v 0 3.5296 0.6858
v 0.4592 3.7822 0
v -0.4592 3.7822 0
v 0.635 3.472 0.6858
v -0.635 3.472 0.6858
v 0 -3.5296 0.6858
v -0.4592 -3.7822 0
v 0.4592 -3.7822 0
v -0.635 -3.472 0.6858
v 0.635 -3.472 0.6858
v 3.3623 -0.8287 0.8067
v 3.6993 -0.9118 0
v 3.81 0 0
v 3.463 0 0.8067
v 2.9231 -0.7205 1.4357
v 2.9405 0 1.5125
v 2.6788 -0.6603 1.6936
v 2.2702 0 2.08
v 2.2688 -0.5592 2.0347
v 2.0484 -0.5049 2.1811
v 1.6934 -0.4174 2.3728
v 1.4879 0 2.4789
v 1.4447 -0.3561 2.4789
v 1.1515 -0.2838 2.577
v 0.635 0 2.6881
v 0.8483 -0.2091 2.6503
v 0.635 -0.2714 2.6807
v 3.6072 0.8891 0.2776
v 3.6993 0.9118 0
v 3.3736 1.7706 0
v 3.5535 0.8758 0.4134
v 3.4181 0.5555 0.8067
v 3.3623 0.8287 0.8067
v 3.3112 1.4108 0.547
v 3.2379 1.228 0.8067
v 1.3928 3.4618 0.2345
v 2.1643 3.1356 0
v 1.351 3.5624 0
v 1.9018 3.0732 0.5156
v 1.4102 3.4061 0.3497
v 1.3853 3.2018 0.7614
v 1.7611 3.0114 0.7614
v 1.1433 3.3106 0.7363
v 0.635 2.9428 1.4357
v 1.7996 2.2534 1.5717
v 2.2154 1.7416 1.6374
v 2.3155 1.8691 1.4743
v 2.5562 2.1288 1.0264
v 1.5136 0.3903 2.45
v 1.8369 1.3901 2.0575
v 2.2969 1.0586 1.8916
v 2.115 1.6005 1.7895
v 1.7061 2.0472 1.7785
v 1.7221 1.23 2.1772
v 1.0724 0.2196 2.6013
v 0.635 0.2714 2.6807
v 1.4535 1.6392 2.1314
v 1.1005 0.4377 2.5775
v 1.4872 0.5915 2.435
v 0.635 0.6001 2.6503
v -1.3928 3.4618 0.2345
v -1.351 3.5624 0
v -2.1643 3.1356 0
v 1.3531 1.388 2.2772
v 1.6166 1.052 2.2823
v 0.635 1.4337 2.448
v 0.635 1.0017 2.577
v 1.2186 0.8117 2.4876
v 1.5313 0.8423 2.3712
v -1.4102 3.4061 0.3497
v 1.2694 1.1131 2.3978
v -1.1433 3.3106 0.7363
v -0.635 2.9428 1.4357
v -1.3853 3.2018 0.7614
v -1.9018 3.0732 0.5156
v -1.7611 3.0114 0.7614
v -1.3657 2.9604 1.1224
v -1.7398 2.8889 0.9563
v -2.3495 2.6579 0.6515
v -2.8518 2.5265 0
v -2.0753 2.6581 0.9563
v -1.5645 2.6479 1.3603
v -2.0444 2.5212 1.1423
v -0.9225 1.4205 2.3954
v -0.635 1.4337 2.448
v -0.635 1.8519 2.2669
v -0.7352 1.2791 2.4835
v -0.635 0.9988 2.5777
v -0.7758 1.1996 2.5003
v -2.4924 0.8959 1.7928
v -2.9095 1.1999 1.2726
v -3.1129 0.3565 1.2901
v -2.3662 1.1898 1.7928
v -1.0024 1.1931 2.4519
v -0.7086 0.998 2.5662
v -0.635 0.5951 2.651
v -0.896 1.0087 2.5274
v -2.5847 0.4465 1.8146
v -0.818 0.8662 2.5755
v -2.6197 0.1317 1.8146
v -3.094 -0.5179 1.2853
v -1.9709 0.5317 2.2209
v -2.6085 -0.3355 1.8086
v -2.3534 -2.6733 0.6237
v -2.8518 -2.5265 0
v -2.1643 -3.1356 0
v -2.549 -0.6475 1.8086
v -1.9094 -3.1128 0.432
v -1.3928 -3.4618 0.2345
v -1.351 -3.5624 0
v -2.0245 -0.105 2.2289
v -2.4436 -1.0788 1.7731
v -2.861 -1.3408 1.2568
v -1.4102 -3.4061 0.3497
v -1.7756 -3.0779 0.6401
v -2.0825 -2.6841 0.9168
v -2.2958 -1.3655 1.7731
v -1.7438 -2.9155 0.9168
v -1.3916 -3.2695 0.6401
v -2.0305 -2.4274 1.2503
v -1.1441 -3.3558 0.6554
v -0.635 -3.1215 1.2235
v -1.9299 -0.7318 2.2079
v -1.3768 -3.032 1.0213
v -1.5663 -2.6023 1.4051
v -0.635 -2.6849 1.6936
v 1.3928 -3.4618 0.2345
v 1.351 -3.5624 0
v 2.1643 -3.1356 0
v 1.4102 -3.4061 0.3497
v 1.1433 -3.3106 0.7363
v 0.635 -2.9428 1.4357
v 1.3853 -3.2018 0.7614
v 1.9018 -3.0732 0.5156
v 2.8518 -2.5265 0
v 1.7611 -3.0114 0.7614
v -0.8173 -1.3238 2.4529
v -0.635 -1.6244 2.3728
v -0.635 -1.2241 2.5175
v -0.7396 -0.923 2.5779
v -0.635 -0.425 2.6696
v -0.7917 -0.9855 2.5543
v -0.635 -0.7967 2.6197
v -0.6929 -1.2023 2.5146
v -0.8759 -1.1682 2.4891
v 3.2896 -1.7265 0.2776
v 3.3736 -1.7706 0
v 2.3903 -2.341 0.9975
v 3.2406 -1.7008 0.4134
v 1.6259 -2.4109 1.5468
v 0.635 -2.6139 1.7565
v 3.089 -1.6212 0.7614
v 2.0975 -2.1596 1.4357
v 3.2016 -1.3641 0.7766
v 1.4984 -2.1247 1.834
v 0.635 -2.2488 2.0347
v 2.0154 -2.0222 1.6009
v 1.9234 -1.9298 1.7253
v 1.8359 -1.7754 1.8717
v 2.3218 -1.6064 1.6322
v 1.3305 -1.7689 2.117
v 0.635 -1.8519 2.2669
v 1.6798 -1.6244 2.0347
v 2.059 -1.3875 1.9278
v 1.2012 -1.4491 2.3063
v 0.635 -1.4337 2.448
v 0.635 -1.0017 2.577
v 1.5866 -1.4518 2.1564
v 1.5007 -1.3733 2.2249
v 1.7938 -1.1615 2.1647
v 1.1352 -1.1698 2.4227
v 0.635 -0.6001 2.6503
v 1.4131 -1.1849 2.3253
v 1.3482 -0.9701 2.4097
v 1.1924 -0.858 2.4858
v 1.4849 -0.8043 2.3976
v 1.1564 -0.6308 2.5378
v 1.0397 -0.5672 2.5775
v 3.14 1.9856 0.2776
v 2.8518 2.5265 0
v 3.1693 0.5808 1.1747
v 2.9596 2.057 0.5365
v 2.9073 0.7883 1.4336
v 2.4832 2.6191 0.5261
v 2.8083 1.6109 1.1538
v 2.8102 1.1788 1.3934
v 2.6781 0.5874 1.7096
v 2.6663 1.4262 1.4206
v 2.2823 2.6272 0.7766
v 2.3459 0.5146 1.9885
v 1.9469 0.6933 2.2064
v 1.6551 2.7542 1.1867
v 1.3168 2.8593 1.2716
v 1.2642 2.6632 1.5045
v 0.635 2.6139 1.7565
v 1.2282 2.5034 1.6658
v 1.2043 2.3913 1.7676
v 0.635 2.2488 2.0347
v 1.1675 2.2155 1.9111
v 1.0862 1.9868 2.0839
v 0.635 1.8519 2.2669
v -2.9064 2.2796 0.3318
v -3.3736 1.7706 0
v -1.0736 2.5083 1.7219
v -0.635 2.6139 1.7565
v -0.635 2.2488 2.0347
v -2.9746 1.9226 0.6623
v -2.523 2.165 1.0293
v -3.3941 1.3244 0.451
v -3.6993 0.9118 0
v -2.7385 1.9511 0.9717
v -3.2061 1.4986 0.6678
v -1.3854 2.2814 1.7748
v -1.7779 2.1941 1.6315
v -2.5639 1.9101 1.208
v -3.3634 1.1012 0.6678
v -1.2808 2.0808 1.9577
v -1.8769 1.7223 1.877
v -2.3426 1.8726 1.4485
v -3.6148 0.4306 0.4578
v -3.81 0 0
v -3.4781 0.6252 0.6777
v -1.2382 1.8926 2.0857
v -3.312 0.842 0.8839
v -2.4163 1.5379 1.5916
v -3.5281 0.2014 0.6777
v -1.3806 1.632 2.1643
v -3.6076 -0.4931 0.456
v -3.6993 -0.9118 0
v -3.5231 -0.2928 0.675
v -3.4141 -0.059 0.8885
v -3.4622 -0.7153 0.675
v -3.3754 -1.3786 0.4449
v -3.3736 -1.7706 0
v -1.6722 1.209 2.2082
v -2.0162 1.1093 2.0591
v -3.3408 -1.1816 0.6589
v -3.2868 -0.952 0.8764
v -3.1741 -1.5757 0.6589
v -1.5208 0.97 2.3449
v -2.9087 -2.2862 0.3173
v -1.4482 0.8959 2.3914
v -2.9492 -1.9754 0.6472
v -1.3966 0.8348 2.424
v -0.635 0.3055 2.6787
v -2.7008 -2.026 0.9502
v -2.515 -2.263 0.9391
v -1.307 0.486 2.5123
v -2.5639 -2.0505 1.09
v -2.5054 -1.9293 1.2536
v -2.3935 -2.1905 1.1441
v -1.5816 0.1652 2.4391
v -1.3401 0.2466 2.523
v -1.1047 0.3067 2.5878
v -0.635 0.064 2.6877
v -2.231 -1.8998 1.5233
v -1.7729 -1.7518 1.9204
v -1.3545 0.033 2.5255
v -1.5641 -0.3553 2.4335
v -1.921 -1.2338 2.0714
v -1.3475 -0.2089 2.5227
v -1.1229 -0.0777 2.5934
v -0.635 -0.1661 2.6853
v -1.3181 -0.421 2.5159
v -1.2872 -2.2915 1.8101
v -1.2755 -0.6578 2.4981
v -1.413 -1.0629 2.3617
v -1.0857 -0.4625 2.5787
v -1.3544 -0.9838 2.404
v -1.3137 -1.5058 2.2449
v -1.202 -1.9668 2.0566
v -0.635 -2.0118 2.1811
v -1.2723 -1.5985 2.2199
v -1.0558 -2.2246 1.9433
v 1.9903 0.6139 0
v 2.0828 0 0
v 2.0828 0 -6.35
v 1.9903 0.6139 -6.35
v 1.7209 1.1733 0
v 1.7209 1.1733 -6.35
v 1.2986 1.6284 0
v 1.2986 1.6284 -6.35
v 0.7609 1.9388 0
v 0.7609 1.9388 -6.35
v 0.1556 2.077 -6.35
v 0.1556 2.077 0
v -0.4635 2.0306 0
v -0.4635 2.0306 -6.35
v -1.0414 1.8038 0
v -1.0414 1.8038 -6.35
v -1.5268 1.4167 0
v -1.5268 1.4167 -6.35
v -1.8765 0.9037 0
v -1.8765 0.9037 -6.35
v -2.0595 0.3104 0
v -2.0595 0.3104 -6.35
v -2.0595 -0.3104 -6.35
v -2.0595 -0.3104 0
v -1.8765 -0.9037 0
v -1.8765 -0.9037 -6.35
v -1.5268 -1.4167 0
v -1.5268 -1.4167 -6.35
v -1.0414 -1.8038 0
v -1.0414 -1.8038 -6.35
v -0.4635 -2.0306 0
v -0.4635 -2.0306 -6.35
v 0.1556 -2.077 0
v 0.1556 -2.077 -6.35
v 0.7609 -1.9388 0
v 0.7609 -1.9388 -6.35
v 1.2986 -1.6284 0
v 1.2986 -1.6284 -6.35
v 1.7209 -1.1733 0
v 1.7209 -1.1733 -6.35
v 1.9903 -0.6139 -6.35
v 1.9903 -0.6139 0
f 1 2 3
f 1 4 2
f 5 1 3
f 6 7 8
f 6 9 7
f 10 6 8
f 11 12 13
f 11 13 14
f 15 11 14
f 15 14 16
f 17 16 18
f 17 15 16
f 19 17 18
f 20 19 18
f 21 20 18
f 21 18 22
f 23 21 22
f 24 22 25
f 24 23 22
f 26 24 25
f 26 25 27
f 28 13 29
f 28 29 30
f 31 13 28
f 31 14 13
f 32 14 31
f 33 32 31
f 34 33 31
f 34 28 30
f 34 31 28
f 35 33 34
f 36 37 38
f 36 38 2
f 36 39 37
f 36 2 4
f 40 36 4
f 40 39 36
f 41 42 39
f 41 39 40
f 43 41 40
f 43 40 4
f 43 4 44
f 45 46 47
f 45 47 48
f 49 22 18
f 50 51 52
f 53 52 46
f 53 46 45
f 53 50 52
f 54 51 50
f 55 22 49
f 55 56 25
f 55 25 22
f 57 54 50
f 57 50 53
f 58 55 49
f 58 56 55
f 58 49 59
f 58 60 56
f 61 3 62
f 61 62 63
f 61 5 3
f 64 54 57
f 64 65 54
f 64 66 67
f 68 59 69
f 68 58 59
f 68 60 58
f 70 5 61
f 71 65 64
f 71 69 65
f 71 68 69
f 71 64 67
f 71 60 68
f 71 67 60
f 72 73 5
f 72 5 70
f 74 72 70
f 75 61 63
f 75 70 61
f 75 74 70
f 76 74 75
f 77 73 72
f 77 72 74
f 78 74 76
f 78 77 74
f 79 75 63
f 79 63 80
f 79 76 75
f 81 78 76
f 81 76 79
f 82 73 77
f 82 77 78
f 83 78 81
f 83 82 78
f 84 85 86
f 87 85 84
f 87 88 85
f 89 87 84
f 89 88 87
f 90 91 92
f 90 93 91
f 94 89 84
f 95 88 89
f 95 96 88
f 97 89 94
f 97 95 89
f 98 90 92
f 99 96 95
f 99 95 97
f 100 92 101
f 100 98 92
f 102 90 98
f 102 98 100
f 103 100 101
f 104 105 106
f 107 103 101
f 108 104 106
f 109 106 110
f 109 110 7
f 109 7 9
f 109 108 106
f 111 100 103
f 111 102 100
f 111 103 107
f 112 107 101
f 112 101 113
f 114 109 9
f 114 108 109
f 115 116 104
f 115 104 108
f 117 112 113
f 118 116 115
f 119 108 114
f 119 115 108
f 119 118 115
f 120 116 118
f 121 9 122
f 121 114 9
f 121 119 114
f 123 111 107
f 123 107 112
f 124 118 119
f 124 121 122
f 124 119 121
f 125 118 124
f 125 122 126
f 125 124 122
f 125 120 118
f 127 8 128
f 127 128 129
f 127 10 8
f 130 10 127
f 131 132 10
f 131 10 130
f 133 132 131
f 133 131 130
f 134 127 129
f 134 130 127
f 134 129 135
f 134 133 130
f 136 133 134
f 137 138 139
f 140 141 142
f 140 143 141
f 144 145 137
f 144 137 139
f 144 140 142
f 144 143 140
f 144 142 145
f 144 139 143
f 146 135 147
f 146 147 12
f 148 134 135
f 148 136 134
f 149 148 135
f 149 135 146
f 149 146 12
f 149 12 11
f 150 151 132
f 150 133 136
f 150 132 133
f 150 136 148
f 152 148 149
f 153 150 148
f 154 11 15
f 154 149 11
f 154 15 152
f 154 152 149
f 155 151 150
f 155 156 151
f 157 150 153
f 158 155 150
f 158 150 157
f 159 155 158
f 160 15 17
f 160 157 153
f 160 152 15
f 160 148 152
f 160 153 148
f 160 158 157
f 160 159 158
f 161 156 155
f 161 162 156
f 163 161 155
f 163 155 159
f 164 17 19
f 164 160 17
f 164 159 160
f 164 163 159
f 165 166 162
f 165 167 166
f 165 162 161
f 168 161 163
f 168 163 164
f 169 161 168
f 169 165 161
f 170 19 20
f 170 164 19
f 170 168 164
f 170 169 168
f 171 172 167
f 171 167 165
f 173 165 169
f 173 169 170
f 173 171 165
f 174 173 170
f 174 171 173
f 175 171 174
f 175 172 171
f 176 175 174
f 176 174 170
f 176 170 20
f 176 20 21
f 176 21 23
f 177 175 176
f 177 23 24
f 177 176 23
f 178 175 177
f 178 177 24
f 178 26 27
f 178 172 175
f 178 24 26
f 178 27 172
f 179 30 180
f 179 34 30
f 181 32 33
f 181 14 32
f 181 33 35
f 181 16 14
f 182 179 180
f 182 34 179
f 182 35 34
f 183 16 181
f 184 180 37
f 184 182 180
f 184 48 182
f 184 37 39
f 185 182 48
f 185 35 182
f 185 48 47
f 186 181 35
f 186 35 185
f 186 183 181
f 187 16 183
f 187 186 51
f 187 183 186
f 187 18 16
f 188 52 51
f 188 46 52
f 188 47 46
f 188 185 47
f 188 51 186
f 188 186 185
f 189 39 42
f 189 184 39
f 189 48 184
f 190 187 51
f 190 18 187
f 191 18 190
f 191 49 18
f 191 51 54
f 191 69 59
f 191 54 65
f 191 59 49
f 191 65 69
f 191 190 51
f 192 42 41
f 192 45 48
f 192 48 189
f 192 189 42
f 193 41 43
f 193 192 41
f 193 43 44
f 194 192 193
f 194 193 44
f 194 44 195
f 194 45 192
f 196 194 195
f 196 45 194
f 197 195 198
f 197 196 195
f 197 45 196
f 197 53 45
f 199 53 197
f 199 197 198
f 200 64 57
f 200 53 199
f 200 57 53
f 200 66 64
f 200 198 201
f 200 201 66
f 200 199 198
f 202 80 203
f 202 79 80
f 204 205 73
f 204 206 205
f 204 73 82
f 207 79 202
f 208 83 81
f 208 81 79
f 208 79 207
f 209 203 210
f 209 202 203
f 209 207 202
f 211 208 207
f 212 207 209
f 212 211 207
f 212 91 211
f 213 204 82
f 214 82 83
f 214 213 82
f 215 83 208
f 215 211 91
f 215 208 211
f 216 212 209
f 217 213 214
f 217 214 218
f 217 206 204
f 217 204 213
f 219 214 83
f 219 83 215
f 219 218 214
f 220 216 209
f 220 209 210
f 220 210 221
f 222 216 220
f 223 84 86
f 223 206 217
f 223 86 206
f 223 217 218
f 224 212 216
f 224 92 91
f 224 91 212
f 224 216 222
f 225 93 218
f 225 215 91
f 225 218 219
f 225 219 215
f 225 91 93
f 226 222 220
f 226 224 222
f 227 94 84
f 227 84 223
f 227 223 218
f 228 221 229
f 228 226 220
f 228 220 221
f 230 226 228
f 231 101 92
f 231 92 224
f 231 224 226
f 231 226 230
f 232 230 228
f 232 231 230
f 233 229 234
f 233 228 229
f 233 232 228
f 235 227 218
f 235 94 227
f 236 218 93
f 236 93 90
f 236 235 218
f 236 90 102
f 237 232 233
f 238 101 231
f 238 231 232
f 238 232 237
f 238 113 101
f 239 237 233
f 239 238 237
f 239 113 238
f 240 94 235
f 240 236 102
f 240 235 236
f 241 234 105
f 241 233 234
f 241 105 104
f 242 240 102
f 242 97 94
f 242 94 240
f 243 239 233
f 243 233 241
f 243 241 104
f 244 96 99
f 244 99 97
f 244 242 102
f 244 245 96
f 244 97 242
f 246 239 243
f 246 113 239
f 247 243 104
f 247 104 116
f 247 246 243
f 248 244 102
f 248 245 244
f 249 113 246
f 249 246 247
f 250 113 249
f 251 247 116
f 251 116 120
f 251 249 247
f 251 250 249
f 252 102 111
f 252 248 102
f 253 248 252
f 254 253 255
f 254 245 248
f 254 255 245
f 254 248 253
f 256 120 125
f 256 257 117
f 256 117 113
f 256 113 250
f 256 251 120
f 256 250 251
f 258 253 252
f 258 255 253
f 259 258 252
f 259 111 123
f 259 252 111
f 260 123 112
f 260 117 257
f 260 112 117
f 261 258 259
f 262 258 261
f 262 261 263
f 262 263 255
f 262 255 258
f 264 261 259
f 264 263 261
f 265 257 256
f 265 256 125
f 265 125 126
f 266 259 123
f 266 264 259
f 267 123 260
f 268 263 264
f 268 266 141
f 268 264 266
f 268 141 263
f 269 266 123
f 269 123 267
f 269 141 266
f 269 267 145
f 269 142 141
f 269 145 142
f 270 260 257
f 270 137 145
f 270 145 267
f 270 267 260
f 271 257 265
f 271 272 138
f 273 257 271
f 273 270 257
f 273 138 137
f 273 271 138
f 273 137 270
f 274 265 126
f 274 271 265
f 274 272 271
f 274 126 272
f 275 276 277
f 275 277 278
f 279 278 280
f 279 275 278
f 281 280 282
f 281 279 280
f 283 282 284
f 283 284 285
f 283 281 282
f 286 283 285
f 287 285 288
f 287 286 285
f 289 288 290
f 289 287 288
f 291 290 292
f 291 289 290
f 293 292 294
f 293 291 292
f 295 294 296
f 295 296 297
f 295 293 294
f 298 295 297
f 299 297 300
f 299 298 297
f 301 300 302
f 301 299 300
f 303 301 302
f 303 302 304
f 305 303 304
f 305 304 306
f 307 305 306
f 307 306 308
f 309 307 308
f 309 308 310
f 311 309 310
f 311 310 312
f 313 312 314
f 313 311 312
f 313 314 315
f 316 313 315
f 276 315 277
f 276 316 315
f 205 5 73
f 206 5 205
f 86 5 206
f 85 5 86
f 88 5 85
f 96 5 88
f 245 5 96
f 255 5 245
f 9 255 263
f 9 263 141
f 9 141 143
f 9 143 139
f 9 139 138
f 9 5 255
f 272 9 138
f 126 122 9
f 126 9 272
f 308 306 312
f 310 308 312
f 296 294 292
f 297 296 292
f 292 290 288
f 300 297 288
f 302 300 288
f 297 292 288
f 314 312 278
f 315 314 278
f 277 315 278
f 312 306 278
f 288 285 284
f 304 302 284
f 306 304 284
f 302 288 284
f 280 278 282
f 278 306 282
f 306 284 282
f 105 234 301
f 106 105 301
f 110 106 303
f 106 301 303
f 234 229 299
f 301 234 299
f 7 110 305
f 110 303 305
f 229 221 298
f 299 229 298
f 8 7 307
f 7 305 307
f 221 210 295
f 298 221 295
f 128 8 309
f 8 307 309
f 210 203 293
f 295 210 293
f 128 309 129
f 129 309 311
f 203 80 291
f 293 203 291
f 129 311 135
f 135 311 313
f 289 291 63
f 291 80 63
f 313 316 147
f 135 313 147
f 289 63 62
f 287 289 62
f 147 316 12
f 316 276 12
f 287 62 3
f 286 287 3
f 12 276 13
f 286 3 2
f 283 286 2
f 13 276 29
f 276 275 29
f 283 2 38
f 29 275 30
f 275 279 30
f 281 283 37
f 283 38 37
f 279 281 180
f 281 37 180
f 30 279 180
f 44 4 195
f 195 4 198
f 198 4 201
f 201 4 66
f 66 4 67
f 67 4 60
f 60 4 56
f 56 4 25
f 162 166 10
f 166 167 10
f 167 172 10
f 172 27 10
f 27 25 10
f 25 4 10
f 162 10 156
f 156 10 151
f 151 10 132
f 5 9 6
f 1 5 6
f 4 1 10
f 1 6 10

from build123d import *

# Parameters (mm, degrees)
F0_R     = 2.0828
F1_DEPTH = 6.35
F0_R_2   = 3.81
F2_DEPTH = 2.7178
F4_W     = 1.27
F4_H     = 4.064
F5_DEPTH = 3.81


# Not quite as in the source:
# - a fillet or chamfer that OpenCascade refuses, or shapes differently, is made with other operations: its cross-section is extruded or revolved along the edge and cut away or added


with BuildPart() as f1:
    # F0 (on Top) → F1 (new body)
    with BuildSketch(Plane.XY):
        Circle(F0_R)
    extrude(amount=-F1_DEPTH)

    # F0 (on Top) → F2 (join)
    with BuildSketch(Plane.XY):
        Circle(F0_R_2)
        Circle(F0_R, mode=Mode.SUBTRACT)
        Circle(F0_R)
    extrude(amount=F2_DEPTH)

    # F3: fillet of radius 3.81 on 1 edges, made by hand

    # F3_s1 → F3_t2 (revolve, cut)
    with BuildSketch(Plane.XZ):
        with BuildLine():
            ThreePointArc((3.81, 0), (2.43529628, 1.9637271915), (0.1599042259, 2.7178))
            Line((0.1599042259, 2.7178), (3.81, 2.7178))
            Line((3.81, 2.7178), (3.81, 0))
        make_face()
    revolve(axis=Axis((0, 0, 2.7178), (0, 0, 1)), mode=Mode.SUBTRACT)

    # F4 (on Front) → F5 (cut, symmetric)
    with BuildSketch(Plane.XZ):
        with Locations((0, 2.7178)):
            Rectangle(F4_W, F4_H)
    extrude(amount=F5_DEPTH, both=True, mode=Mode.SUBTRACT)


solid = f1.part
